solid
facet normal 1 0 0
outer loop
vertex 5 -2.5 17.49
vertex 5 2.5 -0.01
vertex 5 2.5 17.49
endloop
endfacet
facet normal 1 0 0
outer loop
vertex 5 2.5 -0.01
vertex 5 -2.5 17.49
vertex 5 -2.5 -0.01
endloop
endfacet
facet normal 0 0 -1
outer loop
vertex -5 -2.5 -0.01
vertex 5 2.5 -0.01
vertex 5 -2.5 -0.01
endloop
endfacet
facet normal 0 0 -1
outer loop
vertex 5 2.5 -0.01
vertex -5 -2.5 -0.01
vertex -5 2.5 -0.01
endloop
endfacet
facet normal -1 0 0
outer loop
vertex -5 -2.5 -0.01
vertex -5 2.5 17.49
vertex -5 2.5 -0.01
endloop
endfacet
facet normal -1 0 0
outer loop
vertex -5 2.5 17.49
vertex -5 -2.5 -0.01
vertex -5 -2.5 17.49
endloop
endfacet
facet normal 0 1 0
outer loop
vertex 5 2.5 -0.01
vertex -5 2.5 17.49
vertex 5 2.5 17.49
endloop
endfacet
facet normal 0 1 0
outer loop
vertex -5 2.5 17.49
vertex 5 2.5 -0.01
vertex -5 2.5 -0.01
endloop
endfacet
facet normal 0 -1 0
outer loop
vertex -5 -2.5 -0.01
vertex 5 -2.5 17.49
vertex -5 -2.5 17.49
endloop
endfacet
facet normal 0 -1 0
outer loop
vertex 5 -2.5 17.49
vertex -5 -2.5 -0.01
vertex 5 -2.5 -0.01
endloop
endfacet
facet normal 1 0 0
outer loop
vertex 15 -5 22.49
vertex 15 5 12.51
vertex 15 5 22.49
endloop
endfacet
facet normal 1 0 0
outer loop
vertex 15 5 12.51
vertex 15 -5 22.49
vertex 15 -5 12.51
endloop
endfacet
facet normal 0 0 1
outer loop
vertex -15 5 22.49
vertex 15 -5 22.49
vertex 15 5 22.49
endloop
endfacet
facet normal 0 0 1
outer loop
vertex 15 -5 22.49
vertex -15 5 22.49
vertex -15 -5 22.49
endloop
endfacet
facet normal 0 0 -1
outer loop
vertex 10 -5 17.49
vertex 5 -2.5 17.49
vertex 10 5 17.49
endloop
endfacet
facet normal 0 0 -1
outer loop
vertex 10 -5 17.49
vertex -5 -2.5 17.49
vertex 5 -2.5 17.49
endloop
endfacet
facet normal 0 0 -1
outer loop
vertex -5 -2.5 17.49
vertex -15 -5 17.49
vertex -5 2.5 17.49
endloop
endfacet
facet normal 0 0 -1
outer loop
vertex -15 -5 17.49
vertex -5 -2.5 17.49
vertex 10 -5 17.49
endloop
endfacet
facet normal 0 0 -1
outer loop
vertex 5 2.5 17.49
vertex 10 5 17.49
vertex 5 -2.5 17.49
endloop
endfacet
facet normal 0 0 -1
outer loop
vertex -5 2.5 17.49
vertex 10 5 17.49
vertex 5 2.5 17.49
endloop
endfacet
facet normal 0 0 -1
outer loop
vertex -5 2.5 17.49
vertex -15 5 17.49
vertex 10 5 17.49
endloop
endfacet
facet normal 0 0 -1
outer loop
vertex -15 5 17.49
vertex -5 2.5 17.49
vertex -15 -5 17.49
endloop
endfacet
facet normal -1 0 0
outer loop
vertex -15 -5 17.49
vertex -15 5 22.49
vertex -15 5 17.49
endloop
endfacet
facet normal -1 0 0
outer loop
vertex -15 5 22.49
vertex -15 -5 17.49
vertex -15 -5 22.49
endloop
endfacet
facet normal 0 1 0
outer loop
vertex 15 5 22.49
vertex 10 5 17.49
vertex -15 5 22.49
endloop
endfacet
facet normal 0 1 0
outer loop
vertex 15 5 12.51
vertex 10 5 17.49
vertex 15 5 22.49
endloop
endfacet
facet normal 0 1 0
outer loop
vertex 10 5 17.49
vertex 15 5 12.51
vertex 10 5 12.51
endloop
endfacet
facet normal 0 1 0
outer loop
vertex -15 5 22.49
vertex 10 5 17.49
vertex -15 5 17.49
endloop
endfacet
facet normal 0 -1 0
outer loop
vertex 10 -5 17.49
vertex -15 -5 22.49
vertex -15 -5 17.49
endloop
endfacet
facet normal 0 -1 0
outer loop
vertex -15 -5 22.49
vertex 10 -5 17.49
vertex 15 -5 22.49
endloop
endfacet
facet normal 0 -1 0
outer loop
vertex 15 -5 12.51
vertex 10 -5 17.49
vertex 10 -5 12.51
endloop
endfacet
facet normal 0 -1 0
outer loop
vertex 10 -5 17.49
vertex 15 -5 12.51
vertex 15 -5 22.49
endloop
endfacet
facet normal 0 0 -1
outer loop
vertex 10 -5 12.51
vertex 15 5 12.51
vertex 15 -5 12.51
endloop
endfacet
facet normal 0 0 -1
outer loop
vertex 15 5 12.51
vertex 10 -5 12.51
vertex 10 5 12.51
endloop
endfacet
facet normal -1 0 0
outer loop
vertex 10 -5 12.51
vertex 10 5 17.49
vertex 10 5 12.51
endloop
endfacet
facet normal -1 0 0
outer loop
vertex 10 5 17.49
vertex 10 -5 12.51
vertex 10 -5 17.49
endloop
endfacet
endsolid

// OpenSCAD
//test object with overhang of different heights

height_of_base = 20;
width_of_base = 5;
length_of_base = 10;
epsilon = 0.01;

module base()
{
    translate([0, 0, height_of_base/2-epsilon])
    cube([length_of_base, width_of_base, height_of_base], center = true);
}
//base()

module top()
{
    translate([0, 0, height_of_base-epsilon])
    cube([height_of_base*1.5, length_of_base, width_of_base], center = true);
}
//top()

module spout()
{
    translate([height_of_base*1.5/2-width_of_base/2, 0, height_of_base-width_of_base+epsilon])
    cube([width_of_base, length_of_base, width_of_base], center = true);
}
//spout()

module faucet()
{
    union()
    {
        base();
        top();
        spout();
    }
}

faucet();
